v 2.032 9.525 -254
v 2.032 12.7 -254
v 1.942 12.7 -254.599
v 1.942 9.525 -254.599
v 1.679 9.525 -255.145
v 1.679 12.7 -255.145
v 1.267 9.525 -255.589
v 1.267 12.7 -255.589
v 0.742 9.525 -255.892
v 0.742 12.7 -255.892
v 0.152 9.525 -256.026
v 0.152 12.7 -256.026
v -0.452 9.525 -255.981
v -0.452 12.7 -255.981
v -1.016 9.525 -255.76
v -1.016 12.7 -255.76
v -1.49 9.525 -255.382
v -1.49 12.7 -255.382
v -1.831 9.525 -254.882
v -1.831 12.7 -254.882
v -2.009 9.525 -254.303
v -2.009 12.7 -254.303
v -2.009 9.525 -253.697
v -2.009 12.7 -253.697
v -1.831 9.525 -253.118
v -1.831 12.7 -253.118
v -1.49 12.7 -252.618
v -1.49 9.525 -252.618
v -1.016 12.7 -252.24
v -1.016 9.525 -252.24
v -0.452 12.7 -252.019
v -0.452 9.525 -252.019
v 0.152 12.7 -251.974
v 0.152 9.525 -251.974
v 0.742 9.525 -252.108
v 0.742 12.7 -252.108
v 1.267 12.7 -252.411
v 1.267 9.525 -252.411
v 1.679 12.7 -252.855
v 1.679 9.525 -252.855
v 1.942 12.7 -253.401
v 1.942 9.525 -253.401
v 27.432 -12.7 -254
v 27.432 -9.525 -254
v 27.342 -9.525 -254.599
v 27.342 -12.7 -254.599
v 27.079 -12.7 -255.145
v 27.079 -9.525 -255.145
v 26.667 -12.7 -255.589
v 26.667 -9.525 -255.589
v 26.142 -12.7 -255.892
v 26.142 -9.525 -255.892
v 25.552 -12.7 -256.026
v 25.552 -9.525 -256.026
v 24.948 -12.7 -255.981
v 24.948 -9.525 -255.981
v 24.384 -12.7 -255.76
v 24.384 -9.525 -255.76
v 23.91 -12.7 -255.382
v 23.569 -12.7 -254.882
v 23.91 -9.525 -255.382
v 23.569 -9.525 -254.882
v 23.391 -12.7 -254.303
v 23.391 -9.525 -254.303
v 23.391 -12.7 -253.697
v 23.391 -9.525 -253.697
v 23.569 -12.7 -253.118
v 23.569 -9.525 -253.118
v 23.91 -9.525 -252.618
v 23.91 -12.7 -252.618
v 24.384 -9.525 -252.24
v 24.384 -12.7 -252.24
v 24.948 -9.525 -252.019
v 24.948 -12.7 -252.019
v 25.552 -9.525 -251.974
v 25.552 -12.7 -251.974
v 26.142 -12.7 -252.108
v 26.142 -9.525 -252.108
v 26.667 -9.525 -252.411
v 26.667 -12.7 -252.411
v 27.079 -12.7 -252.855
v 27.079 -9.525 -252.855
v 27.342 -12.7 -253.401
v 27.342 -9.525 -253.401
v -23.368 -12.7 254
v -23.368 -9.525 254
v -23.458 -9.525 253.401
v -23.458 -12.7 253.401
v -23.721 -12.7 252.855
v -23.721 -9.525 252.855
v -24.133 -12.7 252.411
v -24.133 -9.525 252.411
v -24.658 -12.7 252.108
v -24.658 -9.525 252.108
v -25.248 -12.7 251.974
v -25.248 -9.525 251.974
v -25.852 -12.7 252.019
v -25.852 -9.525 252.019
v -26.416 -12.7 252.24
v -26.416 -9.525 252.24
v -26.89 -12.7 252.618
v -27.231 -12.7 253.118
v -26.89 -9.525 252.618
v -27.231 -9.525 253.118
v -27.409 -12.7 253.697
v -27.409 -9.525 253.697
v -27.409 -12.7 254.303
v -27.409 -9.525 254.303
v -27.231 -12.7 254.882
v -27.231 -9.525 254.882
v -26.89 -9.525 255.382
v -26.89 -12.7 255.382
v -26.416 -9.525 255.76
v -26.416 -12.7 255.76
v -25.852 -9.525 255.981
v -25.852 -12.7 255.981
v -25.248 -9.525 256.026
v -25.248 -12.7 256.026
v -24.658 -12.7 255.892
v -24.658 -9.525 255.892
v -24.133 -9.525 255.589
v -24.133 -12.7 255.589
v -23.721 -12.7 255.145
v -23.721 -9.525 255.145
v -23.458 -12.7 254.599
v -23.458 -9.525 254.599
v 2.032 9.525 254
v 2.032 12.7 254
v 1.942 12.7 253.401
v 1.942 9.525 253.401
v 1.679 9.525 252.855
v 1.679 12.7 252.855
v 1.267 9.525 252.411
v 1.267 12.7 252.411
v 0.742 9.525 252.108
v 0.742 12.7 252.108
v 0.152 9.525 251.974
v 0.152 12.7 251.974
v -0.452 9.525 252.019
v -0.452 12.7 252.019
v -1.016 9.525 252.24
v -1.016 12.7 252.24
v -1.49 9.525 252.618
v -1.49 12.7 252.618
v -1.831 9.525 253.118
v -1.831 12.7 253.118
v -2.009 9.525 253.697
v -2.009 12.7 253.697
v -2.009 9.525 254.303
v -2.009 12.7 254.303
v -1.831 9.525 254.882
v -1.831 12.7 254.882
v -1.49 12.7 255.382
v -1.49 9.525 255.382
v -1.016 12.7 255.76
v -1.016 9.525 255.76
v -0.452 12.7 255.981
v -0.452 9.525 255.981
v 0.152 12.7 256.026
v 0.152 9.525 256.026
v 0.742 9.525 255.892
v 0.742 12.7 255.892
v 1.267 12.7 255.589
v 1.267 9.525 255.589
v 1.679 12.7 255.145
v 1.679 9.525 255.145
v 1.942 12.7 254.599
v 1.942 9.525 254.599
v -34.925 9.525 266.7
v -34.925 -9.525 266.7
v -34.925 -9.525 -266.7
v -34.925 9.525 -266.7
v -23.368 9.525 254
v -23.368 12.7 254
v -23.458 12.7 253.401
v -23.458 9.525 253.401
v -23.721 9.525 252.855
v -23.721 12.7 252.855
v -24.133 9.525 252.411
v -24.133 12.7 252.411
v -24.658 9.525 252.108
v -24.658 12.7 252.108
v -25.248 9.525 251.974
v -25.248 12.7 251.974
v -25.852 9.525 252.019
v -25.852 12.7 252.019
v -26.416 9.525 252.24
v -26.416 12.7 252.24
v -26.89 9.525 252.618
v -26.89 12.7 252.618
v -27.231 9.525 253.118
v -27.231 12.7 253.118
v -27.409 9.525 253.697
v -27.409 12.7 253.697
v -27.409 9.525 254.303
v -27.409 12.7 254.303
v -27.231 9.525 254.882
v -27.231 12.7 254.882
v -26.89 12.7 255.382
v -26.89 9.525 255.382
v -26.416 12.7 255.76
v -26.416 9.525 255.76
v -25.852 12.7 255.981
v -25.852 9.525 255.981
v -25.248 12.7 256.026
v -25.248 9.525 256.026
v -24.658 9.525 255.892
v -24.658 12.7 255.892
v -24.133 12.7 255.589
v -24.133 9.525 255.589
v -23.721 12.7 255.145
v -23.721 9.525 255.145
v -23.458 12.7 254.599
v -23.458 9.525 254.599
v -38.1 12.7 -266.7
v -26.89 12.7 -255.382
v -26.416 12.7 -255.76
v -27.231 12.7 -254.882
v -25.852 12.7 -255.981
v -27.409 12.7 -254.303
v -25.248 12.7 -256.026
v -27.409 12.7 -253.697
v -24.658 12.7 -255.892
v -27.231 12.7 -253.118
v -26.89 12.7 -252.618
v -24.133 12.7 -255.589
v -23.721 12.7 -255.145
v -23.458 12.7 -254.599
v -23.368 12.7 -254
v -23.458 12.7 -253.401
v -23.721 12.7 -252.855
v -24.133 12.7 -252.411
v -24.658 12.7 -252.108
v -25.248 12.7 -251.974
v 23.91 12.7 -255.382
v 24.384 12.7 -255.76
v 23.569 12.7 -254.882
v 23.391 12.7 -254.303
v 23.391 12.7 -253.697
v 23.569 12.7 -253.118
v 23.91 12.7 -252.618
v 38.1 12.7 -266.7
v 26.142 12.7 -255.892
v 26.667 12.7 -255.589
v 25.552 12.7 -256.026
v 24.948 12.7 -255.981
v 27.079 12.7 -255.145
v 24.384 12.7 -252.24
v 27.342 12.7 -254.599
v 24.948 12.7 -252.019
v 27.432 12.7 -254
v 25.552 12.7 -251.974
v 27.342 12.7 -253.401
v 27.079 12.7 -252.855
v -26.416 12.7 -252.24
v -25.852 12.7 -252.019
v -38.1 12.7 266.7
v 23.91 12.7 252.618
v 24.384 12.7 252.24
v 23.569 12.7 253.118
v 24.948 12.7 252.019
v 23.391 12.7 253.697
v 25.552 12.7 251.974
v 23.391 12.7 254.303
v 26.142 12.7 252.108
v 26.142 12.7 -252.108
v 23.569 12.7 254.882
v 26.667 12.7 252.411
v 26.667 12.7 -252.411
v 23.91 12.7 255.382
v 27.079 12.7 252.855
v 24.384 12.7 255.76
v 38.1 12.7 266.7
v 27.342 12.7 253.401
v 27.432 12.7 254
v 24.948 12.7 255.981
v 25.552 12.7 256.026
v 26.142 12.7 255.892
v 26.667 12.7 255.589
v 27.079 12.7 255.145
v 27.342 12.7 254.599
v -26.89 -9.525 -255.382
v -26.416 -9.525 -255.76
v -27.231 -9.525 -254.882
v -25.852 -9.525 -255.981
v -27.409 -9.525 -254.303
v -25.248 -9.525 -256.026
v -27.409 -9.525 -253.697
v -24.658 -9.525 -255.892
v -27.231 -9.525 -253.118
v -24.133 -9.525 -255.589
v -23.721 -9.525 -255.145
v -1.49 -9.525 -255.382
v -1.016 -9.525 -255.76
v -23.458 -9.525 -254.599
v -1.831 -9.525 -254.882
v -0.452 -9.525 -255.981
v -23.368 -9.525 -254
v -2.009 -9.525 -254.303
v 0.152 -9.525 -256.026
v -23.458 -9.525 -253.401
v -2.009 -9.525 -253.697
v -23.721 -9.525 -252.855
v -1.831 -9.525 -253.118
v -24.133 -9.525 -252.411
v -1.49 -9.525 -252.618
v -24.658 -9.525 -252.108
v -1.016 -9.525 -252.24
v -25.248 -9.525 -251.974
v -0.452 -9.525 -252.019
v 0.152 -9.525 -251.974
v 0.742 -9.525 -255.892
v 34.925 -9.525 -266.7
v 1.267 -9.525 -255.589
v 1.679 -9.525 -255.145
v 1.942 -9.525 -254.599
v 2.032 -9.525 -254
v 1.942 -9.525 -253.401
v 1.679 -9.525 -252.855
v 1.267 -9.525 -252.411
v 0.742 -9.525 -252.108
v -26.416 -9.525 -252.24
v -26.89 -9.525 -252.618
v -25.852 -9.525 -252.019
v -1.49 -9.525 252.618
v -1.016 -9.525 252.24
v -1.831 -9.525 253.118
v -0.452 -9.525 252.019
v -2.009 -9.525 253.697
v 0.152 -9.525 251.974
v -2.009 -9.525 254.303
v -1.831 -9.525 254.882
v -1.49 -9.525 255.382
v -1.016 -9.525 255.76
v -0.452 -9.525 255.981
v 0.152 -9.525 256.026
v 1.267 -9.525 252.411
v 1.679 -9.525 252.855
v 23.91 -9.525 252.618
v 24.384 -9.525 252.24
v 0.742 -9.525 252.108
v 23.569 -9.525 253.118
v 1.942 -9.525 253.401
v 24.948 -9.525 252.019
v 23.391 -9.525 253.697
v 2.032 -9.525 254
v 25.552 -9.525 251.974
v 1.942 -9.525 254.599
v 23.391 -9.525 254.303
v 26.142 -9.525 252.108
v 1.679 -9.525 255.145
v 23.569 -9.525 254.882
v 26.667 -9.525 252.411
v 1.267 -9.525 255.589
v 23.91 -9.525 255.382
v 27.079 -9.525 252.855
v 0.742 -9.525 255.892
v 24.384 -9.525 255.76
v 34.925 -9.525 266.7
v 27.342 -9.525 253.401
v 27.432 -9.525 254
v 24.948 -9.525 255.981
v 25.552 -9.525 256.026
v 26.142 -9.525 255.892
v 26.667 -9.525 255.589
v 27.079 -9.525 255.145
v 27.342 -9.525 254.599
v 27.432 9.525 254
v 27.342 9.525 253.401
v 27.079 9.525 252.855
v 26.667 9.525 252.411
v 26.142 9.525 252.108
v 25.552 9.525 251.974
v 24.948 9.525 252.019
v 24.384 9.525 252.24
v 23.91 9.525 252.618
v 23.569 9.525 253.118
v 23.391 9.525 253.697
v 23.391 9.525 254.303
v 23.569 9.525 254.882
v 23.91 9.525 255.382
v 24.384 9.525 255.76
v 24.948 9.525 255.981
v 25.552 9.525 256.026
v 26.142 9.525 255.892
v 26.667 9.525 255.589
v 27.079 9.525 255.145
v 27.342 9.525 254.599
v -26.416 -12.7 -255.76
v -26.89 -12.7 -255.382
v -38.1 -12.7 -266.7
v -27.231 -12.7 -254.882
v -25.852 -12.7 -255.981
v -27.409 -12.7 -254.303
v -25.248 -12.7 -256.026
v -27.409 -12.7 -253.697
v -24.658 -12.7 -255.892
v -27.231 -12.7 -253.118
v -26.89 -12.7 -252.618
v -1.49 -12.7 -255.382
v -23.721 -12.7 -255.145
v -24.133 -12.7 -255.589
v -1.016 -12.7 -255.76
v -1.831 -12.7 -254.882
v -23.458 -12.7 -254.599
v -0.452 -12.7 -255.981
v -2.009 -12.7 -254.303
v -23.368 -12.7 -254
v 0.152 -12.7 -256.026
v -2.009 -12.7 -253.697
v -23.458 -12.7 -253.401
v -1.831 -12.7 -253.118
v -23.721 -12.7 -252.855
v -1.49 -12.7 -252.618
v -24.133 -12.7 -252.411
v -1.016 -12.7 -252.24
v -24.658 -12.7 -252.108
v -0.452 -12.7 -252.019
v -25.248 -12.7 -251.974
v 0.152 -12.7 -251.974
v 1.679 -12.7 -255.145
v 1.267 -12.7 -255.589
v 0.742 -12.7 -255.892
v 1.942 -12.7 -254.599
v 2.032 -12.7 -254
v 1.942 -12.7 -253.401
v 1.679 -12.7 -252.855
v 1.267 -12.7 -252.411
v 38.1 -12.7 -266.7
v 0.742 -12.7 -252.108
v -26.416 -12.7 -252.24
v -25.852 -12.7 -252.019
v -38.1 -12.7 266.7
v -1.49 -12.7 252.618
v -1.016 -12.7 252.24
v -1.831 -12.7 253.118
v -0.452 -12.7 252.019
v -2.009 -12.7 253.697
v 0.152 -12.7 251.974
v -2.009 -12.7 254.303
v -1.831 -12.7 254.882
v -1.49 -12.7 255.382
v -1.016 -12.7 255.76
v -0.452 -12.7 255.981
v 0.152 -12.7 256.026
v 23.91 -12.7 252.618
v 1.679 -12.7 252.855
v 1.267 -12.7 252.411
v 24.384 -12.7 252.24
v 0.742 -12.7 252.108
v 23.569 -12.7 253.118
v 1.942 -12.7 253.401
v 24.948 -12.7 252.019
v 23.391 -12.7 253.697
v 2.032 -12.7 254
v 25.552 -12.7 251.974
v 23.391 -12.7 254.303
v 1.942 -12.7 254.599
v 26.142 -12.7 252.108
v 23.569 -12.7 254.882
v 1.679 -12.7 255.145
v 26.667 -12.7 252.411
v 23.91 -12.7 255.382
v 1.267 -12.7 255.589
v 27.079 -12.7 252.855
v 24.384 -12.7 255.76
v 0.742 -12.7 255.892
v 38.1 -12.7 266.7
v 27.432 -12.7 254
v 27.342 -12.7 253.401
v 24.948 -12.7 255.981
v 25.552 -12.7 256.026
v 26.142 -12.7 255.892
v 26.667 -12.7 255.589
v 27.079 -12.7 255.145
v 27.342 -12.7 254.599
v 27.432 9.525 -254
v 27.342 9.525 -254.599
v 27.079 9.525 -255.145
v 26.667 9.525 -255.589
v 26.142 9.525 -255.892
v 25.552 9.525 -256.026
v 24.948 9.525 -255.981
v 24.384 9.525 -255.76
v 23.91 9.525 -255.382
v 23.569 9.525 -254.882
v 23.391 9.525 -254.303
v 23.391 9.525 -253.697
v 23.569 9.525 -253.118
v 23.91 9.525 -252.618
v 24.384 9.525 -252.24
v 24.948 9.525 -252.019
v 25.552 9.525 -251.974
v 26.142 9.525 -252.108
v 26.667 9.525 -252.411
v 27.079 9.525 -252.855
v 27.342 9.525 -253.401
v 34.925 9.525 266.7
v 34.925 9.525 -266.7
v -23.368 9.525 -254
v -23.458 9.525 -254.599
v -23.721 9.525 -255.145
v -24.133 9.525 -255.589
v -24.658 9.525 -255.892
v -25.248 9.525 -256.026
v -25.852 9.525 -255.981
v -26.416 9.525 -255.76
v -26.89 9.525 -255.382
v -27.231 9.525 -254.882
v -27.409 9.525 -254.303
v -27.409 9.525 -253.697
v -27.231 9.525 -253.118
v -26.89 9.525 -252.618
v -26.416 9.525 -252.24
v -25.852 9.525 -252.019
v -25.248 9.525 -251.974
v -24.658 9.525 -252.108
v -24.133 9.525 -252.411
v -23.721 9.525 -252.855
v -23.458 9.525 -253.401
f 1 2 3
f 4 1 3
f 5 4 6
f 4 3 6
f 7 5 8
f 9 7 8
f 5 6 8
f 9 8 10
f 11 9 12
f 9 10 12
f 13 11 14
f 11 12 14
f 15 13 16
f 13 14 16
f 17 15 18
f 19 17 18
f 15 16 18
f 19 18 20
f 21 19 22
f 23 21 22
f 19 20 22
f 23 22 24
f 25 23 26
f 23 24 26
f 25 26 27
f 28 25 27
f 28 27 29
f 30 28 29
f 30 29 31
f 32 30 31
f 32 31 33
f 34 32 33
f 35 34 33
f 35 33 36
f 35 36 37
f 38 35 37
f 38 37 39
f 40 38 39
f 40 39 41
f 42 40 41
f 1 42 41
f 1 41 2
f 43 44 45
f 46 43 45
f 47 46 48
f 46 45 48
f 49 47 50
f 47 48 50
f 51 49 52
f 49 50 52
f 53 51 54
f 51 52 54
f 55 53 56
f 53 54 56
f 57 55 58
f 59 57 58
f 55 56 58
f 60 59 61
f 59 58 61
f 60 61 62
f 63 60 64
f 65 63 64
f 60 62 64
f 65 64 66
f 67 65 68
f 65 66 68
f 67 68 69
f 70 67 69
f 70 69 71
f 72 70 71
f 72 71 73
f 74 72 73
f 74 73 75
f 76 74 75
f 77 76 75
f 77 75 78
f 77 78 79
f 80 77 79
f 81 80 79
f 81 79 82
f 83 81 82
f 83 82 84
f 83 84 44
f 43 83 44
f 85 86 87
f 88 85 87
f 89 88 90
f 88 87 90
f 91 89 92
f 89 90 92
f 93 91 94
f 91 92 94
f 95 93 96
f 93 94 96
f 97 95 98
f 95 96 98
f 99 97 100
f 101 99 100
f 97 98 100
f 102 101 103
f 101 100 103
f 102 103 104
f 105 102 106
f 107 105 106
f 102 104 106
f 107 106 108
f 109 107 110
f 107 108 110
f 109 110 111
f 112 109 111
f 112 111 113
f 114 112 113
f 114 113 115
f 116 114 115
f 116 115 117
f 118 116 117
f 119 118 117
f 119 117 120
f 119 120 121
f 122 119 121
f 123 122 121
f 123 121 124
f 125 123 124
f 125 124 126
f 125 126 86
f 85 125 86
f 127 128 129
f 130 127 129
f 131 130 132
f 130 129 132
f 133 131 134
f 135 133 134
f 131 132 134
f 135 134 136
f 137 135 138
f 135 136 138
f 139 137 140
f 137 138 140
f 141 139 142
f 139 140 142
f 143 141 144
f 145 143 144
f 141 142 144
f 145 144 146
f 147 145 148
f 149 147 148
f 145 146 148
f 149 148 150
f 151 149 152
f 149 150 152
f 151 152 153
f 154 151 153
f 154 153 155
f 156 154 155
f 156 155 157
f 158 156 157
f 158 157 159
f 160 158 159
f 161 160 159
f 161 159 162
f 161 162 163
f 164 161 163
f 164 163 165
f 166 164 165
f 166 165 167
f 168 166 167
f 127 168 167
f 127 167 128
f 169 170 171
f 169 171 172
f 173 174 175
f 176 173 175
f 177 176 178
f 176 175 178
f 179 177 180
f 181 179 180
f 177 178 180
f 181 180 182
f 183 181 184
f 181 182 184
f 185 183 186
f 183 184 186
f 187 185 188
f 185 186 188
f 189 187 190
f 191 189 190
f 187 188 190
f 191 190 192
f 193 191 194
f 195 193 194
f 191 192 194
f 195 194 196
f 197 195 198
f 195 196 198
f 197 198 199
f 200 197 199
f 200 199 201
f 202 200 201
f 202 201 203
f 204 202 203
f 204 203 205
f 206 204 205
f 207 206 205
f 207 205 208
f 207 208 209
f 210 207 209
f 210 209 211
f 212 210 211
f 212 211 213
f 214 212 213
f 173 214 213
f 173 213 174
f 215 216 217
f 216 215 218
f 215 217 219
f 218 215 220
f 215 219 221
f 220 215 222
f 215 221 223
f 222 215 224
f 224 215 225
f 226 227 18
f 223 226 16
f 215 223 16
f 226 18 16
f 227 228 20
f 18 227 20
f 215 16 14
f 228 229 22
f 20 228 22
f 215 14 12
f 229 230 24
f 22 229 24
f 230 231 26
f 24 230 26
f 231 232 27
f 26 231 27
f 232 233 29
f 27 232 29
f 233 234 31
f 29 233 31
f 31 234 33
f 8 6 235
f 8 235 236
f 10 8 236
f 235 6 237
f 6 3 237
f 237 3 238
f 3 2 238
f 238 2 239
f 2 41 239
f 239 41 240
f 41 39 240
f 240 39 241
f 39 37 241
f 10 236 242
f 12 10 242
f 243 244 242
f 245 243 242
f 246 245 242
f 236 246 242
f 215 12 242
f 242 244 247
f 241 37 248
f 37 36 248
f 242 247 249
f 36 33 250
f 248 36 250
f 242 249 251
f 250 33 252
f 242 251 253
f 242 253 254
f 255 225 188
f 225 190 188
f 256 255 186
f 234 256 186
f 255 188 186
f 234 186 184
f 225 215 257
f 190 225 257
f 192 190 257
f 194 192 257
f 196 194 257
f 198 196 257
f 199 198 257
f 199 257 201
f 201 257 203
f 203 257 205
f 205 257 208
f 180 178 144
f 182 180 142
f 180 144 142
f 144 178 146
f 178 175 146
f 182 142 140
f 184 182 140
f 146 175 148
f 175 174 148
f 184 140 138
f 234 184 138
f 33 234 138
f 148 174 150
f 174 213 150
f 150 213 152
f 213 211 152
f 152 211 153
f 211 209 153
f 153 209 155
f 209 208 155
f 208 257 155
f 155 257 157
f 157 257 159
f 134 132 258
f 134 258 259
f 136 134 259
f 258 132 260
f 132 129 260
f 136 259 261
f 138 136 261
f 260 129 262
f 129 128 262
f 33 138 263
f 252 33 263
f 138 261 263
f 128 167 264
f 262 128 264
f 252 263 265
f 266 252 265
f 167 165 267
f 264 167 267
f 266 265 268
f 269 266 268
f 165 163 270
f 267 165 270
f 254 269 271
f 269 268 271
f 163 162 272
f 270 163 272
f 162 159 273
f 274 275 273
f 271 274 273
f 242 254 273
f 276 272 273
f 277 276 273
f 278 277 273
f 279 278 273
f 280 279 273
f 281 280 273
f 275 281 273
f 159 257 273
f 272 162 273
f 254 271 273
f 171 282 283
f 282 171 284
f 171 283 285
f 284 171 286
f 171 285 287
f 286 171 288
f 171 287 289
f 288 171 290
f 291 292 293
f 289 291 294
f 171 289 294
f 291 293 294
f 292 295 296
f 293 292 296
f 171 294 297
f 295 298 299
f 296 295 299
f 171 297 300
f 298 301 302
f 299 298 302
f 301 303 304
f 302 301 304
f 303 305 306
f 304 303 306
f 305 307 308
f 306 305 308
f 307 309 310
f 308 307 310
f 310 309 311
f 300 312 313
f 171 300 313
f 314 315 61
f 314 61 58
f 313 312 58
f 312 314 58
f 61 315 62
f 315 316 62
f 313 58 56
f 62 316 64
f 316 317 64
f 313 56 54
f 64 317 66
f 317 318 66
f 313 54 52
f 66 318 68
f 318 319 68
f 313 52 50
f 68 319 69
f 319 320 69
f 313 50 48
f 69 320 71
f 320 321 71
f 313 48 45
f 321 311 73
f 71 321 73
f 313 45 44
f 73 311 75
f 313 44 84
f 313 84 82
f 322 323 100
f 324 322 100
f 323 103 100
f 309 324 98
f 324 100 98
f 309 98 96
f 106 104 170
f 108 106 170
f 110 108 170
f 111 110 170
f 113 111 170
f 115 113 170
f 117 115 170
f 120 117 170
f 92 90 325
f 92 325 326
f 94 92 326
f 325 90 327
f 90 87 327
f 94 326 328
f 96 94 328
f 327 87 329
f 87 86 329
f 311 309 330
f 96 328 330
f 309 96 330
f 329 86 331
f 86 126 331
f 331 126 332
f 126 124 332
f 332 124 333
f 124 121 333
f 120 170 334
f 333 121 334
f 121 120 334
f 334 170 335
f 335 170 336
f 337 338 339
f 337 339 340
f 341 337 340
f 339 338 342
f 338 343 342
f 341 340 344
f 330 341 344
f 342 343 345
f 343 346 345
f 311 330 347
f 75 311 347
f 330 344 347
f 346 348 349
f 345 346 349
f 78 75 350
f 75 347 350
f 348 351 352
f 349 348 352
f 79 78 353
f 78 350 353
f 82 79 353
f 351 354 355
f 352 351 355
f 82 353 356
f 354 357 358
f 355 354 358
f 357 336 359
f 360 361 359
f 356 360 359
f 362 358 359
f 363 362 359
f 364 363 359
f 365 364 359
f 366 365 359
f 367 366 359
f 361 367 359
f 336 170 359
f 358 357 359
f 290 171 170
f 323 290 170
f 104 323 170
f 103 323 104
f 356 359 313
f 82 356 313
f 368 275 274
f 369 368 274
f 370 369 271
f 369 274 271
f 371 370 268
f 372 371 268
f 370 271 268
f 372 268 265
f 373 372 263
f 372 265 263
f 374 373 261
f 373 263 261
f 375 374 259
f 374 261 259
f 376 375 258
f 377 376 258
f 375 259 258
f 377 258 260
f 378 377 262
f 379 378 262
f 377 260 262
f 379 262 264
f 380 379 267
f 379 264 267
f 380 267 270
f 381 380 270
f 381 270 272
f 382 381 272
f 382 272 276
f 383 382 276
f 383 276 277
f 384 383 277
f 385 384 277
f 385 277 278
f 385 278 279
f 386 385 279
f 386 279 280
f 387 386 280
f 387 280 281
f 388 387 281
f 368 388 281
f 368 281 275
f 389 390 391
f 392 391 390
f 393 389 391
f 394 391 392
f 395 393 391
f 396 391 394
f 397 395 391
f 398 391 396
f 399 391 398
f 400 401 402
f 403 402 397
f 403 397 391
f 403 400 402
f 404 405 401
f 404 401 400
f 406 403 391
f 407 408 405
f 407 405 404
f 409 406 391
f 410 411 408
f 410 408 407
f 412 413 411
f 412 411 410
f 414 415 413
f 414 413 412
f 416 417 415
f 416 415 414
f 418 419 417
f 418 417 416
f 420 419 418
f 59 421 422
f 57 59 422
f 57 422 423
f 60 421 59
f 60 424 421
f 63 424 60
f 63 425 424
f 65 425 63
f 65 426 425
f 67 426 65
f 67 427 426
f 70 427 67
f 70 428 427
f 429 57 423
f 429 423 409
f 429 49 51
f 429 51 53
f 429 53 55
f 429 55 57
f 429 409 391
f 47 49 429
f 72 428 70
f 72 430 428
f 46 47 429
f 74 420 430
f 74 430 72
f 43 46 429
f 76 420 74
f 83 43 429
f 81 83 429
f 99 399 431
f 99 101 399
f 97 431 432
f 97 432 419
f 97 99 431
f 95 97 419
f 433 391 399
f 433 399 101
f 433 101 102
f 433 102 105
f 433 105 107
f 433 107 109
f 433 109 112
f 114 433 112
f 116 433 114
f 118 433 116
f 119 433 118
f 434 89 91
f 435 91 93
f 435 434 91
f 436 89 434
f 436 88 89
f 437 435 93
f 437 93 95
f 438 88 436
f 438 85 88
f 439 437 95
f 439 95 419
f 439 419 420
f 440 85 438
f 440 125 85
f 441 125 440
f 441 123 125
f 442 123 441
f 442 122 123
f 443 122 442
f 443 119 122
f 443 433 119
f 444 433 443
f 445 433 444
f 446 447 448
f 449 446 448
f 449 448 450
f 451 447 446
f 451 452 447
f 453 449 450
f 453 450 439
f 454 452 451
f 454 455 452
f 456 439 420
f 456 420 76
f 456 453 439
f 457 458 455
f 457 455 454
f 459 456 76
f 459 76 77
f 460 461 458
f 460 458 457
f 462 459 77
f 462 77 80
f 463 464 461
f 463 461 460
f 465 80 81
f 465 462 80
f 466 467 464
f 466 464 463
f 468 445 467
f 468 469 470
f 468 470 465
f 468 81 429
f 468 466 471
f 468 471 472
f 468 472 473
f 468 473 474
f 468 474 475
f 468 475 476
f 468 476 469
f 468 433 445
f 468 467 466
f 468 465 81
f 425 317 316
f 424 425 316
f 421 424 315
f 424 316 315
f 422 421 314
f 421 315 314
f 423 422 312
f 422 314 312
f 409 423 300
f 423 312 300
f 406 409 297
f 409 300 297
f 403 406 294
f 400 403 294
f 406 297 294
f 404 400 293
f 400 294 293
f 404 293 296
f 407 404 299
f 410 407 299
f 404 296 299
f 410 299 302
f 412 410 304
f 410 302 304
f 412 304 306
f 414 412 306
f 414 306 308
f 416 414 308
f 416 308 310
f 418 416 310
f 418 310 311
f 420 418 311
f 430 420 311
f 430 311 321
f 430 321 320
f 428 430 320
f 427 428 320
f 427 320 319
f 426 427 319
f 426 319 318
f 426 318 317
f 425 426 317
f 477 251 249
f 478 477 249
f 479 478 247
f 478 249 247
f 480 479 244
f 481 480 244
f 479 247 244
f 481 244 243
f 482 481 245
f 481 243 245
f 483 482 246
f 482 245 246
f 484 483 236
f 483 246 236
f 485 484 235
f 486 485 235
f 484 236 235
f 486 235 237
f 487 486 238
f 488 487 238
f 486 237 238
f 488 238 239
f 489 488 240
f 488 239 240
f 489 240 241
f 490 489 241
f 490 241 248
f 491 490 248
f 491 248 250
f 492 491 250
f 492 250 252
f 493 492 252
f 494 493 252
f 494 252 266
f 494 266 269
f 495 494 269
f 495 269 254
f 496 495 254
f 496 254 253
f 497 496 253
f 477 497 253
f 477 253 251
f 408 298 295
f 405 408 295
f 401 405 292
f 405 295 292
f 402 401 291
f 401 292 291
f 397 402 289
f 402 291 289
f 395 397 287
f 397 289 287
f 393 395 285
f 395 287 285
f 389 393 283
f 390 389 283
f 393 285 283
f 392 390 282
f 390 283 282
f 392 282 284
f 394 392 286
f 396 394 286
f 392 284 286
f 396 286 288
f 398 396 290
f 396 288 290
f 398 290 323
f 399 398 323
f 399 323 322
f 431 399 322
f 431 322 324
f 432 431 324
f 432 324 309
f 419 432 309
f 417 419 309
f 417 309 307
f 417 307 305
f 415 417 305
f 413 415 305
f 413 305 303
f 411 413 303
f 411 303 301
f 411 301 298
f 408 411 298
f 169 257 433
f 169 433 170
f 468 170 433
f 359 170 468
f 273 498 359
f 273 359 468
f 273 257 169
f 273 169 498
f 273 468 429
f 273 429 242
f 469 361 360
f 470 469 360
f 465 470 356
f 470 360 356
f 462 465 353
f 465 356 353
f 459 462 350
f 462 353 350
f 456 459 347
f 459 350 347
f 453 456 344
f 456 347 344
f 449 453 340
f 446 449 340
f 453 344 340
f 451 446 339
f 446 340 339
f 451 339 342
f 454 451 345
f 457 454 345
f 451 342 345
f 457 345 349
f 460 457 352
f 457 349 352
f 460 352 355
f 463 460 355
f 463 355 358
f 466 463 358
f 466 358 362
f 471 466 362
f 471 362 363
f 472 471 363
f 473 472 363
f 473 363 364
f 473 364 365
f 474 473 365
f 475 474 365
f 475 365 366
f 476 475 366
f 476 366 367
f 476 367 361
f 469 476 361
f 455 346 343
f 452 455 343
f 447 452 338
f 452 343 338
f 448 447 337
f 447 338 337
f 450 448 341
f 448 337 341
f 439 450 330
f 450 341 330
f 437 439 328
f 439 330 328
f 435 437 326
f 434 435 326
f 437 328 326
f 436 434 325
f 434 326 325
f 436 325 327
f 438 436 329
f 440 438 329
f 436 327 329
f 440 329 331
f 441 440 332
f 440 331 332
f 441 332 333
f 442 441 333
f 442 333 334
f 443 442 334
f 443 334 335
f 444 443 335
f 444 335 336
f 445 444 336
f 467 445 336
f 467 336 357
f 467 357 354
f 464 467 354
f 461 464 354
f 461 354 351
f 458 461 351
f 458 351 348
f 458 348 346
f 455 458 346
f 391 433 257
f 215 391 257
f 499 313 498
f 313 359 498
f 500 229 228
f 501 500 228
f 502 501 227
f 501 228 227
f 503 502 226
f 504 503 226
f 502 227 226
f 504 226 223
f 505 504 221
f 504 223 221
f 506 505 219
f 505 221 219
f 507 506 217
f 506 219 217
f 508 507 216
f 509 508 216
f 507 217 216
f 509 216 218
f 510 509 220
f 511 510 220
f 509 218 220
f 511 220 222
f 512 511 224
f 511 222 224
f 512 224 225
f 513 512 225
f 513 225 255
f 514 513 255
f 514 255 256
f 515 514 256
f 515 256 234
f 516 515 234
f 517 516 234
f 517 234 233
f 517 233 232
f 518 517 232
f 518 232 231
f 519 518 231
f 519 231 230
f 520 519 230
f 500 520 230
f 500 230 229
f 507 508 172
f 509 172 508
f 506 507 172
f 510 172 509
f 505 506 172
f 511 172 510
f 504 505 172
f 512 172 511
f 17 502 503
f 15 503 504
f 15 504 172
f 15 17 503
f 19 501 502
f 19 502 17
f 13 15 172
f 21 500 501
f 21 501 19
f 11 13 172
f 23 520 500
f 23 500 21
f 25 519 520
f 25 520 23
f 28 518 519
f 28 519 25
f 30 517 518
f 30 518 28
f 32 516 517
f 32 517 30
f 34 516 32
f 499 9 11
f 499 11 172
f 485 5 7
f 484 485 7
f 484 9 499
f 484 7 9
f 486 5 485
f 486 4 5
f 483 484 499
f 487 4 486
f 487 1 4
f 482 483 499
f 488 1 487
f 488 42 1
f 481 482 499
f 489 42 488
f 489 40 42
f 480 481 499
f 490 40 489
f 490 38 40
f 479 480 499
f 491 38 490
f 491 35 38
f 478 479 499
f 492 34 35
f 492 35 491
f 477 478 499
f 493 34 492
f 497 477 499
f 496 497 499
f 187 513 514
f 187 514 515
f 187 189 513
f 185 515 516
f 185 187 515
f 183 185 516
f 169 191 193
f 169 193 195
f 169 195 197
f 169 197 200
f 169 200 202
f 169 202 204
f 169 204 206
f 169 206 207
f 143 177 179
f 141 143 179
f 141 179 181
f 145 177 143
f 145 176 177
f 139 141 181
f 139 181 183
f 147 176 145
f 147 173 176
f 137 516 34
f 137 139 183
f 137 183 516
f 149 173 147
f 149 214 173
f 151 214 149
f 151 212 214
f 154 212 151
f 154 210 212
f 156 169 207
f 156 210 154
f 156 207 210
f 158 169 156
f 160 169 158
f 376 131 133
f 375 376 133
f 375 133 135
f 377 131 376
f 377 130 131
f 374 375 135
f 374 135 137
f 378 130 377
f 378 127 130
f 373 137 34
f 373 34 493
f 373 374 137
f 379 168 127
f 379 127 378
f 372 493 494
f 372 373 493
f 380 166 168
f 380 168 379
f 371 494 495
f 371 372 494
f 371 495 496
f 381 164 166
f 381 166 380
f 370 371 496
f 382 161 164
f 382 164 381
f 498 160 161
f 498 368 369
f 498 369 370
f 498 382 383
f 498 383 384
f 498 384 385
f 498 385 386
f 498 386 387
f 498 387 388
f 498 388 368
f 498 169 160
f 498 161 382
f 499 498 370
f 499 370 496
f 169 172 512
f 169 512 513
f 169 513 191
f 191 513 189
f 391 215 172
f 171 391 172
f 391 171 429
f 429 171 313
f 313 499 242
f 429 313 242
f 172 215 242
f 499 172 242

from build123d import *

# Parameters (mm, degrees)
SKETCH1_W           = 76.2
SKETCH1_H           = 25.4
SKETCH1_W_2         = 69.85
SKETCH1_H_2         = 19.05
EXTRUDE_THIN1_DEPTH = 266.7
SKETCH2_R           = 2.032
CUT_EXTRUDE1_DEPTH  = 26.4


with BuildPart() as part:
    # Sketch1 → Extrude-Thin1 (new body, symmetric)
    with BuildSketch(Plane.XY):
        Rectangle(SKETCH1_W, SKETCH1_H)
        Rectangle(SKETCH1_W_2, SKETCH1_H_2, mode=Mode.SUBTRACT)
    extrude(amount=EXTRUDE_THIN1_DEPTH, both=True)

    # Sketch2 → Cut-Extrude1 (cut, through all)
    with BuildSketch(Plane(origin=(0, 12.7, 0), x_dir=(1, 0, 0), z_dir=(0, 1, 0))):
        with Locations((25.4, 254)):
            Circle(SKETCH2_R)
        with Locations((0, 254)):
            Circle(SKETCH2_R)
        with Locations((25.4, -254)):
            Circle(SKETCH2_R)
        with Locations((0, -254)):
            Circle(SKETCH2_R)
        with Locations((-25.4, 254)):
            Circle(SKETCH2_R)
        with Locations((-25.4, -254)):
            Circle(SKETCH2_R)
    extrude(amount=-CUT_EXTRUDE1_DEPTH, mode=Mode.SUBTRACT)


solid = part.part
